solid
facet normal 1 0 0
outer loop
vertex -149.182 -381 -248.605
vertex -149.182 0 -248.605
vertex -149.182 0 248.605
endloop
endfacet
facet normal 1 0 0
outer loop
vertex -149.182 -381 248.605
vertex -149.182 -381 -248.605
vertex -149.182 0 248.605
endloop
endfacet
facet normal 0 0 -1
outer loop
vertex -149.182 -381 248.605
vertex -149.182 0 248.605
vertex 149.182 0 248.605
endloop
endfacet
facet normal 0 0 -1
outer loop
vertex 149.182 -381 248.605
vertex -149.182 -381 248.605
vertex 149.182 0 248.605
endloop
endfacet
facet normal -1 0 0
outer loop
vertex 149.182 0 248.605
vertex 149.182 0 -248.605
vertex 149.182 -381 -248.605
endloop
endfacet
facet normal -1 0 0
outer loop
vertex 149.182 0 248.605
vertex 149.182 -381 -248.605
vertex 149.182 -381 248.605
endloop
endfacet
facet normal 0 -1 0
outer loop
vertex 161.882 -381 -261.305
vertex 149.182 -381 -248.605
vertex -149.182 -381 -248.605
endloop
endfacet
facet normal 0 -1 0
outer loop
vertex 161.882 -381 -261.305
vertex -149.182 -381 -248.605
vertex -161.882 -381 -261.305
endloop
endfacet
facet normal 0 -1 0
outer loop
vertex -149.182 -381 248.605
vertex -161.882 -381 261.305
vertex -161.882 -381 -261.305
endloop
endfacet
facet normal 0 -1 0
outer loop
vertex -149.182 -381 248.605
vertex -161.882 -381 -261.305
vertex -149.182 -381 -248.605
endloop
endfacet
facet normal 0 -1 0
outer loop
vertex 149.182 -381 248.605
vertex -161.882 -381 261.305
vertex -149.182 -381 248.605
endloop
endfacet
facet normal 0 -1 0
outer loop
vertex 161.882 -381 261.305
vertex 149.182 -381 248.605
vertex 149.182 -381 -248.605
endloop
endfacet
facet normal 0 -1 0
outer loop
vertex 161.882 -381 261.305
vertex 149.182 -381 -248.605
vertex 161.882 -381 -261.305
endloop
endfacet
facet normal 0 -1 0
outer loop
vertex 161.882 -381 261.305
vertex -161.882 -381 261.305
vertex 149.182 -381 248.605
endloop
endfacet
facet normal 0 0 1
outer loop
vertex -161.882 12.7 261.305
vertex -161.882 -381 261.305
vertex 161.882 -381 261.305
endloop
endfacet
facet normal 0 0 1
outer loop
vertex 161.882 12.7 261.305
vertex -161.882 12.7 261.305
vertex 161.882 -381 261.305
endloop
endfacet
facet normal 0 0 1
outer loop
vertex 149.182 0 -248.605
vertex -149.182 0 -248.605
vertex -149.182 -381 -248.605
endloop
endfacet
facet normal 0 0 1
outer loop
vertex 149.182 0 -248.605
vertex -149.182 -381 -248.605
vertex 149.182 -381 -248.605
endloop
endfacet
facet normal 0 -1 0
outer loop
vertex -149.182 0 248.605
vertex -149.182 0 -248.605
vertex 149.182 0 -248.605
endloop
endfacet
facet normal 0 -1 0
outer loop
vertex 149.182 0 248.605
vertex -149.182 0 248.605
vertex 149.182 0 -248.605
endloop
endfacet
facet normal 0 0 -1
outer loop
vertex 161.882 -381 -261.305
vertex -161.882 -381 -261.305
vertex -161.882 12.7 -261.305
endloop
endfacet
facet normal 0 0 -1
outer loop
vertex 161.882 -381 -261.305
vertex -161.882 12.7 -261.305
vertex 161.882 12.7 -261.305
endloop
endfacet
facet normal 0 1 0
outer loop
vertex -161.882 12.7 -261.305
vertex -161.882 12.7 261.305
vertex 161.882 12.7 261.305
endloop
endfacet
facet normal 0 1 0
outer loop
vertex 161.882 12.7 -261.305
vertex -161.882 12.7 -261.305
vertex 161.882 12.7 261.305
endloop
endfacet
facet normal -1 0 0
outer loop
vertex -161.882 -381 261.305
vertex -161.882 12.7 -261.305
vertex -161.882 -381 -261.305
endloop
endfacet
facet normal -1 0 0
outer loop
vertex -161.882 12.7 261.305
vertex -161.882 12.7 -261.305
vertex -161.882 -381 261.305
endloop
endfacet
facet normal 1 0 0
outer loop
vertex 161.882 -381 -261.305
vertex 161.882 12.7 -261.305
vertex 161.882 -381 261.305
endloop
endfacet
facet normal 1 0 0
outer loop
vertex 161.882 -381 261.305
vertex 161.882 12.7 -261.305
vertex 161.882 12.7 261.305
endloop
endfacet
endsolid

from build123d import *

# Parameters (mm, degrees)
F0_W     = 298.3636856079
F0_H     = 497.2105026245
F1_DEPTH = 381
F2_T     = 12.7


with BuildPart() as f1:
    # F0 (on Front) → F1 (new body)
    with BuildSketch(Plane.XZ):
        Rectangle(F0_W, F0_H)
    extrude(amount=F1_DEPTH)

    # F2
    f2_openings = [f1.faces().sort_by_distance(p)[0] for p in [
        (0, -381, 0),
    ]]
    offset(amount=F2_T, openings=f2_openings, kind=Kind.INTERSECTION)


solid = f1.part
